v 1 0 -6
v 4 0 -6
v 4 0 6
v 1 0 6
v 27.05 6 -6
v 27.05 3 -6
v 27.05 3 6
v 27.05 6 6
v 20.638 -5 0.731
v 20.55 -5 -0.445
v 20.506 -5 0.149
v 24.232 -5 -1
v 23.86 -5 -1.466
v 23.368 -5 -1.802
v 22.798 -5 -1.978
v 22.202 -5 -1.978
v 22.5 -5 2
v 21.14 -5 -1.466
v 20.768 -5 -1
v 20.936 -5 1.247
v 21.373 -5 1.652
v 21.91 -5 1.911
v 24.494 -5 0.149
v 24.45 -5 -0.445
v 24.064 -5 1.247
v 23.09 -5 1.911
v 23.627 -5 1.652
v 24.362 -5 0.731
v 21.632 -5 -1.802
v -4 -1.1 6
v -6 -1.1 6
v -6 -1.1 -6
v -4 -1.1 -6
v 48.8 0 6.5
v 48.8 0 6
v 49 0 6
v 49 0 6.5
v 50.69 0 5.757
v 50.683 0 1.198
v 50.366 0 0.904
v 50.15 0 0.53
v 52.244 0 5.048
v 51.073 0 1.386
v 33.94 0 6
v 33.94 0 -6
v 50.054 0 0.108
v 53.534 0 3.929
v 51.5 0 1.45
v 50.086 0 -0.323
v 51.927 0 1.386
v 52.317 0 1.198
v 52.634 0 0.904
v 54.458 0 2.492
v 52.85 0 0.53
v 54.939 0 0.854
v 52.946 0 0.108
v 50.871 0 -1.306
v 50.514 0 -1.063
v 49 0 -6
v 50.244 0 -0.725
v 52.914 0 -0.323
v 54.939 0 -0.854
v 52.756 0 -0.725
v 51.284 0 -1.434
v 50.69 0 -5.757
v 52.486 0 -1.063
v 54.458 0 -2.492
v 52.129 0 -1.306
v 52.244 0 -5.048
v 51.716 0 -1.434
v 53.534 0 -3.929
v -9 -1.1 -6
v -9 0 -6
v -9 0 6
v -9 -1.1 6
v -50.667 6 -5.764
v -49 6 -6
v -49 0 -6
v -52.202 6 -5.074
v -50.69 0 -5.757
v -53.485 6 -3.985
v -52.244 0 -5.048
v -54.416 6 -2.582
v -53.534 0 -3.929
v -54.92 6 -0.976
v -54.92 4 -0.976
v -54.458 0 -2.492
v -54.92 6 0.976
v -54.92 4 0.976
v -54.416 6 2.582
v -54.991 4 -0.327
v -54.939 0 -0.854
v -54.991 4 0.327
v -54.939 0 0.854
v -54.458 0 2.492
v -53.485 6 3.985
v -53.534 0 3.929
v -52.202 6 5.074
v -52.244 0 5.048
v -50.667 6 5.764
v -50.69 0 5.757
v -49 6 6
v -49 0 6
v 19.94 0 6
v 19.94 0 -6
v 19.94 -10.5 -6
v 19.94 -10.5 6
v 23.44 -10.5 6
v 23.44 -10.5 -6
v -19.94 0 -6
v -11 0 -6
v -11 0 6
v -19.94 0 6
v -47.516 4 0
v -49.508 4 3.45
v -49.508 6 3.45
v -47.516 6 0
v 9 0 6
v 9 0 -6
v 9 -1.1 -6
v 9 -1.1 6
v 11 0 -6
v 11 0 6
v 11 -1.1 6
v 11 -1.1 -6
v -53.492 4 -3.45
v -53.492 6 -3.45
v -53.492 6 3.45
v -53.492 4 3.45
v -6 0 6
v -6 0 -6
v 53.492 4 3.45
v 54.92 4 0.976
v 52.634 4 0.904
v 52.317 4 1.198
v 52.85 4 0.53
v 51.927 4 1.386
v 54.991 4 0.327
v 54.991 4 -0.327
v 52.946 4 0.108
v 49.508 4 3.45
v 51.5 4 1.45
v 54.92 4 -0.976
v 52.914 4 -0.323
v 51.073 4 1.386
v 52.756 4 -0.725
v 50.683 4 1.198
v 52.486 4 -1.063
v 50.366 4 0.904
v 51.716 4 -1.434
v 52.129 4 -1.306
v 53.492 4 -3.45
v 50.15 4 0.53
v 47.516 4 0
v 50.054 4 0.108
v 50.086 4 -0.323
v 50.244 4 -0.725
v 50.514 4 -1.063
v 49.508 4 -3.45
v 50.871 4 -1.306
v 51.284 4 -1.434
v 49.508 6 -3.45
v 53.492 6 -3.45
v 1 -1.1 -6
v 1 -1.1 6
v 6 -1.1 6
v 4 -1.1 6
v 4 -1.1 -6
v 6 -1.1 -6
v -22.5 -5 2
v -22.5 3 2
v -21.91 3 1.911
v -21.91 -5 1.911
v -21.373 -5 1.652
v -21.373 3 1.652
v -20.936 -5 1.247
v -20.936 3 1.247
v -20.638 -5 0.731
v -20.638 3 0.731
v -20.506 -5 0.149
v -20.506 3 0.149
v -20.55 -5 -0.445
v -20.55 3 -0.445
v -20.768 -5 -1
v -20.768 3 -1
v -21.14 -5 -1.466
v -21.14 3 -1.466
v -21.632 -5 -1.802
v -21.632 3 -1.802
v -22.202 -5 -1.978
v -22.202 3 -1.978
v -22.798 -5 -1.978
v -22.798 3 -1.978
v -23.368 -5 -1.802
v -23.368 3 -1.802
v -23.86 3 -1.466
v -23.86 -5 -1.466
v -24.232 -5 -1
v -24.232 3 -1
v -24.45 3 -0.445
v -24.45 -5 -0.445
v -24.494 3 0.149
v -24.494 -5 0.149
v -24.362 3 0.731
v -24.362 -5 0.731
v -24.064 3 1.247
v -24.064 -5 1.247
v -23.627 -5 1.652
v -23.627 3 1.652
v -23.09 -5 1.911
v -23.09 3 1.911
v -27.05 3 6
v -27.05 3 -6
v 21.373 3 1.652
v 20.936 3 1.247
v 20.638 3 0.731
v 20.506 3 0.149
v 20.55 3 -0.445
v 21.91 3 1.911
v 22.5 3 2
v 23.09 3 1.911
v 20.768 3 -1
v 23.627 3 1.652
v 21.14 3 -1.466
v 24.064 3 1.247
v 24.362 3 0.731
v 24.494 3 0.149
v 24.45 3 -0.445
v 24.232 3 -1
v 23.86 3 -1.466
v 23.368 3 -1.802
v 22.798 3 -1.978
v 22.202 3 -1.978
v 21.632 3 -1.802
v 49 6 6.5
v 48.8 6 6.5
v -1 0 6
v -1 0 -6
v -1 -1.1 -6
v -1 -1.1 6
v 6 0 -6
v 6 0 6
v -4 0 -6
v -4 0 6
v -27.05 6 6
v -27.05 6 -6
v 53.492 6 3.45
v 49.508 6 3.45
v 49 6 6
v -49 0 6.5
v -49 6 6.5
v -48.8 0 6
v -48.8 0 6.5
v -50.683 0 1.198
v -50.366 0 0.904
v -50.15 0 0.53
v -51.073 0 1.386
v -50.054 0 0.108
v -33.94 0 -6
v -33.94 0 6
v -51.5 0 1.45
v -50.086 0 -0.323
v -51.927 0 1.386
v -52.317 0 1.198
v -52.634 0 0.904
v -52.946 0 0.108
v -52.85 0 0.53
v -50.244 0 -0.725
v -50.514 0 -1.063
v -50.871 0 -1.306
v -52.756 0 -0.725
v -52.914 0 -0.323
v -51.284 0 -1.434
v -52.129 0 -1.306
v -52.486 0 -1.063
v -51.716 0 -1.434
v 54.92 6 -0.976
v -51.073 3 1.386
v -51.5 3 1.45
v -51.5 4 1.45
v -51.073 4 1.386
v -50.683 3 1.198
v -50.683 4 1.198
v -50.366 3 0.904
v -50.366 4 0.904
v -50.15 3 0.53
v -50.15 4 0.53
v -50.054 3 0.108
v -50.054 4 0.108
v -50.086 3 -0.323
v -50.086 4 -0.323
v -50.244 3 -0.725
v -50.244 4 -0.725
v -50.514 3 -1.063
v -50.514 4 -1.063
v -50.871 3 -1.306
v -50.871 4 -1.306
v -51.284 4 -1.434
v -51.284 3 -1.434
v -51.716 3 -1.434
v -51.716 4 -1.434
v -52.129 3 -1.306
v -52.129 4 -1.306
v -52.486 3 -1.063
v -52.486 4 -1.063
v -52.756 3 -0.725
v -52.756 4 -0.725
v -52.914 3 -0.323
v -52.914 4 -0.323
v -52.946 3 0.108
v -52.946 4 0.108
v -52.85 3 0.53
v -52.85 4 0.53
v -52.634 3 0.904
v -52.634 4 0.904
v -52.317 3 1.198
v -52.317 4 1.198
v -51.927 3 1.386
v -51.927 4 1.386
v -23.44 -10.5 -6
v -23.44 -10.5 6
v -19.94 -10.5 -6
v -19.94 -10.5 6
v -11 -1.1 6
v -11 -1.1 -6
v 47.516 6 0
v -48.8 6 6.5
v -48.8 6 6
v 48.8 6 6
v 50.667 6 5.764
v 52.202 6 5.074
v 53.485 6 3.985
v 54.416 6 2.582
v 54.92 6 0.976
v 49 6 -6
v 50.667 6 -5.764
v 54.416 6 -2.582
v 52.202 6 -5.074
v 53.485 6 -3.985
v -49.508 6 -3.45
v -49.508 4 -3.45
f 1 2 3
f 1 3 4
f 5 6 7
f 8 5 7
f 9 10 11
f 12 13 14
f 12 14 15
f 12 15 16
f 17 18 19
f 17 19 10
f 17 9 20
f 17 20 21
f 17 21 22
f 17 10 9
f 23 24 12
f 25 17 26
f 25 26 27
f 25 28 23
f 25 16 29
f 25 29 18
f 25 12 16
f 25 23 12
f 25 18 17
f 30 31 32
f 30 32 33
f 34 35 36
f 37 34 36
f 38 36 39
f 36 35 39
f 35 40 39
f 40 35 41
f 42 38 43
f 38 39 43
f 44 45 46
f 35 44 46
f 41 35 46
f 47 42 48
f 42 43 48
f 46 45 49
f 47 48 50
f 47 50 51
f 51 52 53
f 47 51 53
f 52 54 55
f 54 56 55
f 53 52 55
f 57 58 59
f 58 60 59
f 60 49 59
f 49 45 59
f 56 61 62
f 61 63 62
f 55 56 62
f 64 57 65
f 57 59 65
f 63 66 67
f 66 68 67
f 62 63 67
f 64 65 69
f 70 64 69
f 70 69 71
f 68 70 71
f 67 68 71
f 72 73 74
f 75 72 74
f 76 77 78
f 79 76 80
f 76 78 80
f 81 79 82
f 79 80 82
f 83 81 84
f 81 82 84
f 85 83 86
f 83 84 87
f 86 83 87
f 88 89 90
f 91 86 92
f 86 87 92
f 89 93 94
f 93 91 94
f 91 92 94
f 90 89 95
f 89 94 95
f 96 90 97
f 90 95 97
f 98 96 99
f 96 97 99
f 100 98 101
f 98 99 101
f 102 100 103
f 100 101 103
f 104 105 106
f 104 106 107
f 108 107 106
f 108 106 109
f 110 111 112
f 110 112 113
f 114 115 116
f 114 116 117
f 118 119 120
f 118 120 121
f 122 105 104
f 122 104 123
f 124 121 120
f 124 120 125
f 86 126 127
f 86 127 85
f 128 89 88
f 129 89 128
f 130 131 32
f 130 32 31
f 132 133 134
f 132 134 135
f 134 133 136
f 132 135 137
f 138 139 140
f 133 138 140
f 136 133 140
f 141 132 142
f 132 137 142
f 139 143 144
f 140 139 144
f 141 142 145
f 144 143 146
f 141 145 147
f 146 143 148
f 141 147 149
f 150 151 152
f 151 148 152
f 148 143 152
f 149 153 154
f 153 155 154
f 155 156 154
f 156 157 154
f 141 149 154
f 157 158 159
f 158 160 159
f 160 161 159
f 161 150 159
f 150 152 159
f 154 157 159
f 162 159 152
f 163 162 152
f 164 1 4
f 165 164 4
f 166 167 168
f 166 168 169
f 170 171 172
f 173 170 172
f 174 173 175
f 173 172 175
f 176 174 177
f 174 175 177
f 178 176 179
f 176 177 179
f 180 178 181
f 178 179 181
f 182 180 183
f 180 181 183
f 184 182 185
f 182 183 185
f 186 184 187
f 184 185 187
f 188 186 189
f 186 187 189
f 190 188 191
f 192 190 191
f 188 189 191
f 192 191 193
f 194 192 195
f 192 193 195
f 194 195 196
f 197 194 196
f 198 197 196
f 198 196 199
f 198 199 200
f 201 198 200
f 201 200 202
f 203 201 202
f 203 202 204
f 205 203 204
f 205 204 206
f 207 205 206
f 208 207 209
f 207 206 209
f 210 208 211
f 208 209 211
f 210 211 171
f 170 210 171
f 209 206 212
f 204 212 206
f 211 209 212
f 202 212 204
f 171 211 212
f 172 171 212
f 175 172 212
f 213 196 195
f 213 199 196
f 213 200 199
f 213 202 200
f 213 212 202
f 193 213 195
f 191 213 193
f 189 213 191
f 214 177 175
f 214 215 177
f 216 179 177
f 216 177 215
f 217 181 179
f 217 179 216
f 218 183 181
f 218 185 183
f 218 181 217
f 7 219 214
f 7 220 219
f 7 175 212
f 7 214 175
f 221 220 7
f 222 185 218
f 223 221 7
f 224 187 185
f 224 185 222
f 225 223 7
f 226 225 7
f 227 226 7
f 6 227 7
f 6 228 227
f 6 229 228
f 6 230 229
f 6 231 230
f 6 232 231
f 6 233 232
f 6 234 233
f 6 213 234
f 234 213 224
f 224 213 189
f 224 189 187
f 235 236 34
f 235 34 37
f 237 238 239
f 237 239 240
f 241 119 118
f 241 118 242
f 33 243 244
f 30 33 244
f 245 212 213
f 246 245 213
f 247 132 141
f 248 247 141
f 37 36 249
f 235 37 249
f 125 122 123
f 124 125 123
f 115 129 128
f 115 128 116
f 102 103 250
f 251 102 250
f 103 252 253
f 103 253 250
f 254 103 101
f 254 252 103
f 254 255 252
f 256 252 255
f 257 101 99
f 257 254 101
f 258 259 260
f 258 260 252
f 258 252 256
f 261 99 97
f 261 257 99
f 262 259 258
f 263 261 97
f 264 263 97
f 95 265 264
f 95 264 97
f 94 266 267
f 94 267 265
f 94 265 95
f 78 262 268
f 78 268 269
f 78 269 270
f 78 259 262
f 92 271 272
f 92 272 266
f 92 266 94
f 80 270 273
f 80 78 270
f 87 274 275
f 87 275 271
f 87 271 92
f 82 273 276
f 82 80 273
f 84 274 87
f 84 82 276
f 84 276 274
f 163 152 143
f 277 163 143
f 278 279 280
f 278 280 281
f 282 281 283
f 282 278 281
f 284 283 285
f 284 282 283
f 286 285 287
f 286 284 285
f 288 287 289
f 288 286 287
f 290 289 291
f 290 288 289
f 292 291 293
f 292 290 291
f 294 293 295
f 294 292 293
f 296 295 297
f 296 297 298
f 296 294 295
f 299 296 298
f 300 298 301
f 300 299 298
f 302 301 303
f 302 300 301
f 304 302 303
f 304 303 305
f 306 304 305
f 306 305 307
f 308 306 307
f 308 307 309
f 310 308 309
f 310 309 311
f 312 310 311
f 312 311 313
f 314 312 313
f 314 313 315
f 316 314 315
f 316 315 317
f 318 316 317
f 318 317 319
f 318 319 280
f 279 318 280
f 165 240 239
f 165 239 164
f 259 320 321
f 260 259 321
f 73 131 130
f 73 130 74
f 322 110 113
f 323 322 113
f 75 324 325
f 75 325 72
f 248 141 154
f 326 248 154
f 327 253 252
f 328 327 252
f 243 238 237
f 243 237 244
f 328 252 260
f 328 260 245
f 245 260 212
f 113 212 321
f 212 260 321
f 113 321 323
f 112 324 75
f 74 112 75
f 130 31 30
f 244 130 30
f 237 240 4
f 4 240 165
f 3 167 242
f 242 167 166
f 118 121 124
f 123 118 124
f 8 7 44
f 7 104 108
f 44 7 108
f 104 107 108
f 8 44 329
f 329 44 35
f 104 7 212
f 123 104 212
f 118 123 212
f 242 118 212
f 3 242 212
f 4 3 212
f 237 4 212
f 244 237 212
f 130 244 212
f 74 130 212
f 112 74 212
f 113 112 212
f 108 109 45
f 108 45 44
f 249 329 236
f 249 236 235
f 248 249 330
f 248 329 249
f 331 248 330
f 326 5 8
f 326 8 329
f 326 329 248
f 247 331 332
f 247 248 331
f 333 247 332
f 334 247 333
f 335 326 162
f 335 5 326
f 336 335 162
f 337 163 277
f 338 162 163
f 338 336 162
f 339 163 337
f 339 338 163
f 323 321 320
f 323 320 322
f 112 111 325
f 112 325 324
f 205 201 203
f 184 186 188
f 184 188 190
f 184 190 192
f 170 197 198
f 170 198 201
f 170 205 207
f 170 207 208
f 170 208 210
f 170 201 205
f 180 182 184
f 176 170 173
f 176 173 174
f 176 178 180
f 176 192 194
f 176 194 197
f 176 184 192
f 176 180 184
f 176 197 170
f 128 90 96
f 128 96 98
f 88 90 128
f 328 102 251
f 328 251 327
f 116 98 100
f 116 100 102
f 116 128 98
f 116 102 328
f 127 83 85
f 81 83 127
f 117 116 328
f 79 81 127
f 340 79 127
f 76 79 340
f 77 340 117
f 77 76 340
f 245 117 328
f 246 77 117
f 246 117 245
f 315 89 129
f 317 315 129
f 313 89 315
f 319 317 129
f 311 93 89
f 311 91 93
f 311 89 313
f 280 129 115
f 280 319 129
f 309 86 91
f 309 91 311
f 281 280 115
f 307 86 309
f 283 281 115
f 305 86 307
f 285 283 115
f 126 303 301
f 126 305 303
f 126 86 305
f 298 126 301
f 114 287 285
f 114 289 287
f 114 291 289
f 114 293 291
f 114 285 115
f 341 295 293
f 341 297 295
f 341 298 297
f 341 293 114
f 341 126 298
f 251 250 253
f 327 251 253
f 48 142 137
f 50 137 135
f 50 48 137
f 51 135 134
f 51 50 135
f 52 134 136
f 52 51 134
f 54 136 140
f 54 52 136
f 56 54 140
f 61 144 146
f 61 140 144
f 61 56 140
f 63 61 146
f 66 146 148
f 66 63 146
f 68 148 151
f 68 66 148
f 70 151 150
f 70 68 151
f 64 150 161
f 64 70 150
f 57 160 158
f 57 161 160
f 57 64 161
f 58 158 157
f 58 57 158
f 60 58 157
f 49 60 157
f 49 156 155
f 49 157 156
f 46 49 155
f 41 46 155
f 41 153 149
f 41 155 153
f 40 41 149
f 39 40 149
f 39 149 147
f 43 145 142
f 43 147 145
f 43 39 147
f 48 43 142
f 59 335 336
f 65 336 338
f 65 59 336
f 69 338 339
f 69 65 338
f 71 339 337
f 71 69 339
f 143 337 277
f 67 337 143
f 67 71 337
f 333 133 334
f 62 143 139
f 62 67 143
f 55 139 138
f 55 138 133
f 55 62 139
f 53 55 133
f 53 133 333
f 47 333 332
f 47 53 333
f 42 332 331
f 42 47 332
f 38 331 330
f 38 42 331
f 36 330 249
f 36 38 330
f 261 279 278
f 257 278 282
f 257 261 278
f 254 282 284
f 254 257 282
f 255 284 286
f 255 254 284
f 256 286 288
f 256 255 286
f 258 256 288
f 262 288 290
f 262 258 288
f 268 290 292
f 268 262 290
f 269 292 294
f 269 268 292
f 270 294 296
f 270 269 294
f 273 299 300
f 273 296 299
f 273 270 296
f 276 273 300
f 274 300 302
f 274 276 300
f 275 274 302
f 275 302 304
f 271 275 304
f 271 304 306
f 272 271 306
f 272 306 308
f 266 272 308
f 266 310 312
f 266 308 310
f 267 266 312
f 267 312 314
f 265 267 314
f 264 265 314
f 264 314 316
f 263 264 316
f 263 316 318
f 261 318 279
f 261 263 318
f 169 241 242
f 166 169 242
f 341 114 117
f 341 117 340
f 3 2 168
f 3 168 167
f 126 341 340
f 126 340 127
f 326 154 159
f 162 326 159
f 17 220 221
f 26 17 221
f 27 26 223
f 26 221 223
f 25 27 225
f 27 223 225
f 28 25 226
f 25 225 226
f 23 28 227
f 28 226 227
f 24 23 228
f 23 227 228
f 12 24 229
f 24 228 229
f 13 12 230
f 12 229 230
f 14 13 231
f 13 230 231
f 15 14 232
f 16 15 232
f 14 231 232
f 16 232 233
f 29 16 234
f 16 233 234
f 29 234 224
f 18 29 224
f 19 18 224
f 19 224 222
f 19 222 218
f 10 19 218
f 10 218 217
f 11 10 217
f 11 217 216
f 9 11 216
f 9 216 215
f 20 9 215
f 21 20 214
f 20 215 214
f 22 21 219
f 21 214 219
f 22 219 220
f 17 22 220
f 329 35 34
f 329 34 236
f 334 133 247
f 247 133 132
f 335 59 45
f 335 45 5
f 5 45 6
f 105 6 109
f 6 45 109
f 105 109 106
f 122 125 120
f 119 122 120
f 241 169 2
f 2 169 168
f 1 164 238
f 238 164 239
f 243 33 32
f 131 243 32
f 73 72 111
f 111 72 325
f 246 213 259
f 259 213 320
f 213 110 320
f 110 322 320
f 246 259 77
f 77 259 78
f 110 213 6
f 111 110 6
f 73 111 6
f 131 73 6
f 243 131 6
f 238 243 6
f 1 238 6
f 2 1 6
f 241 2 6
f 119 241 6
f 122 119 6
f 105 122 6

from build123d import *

# Parameters (mm, degrees)
SKETCH1_R                 = 1.45
BOSS_EXTRUDE1_DEPTH       = 3
SKETCH4_W                 = 3.5
SKETCH4_H                 = 12
BOSS_EXTRUDE3_DEPTH       = 10.5
SKETCH5_W                 = 2
SKETCH5_H                 = 12
BOSS_EXTRUDE4_DEPTH       = 1.1
SKETCH6_W                 = 0.2
SKETCH6_H                 = 3
BOSS_EXTRUDE5_DEPTH       = 0.5
CHAMFER1_SIZE             = 10.5
F_3_0MM_DOWEL_HOLE1_D     = 2.9
F_3_0MM_DOWEL_HOLE1_DEPTH = 13.5
SKETCH10_R                = 1.45
BOSS_EXTRUDE6_DEPTH       = 3
CUT_EXTRUDE1_START        = -2
SKETCH11_R                = 1.45
CUT_EXTRUDE1_DEPTH        = 2
SKETCH12_R                = 2
CUT_EXTRUDE2_DEPTH        = 8


with BuildPart() as part:
    # Sketch1 → Boss-Extrude1 (new body)
    with BuildSketch(Plane(origin=(0, 0, 0), x_dir=(1, 0, 0), z_dir=(0, 1, 0))):
        with BuildLine():
            Line((-49, 6), (49, 6))
            ThreePointArc((49, 6), (55, 0), (49, -6))
            Line((49, -6), (-49, -6))
            ThreePointArc((-49, -6), (-55, 0), (-49, 6))
        make_face()
        with Locations(Location((-51.5, 0, 0), (0, 0, 270))):
            Circle(SKETCH1_R, mode=Mode.SUBTRACT)
        with Locations(Location((51.5, 0, 0), (0, 0, 270))):
            Circle(SKETCH1_R, mode=Mode.SUBTRACT)
    extrude(amount=BOSS_EXTRUDE1_DEPTH)

    # Sketch4 → Boss-Extrude3 (add)
    with BuildSketch(Plane.XZ):
        with Locations((-21.690023983, 0)):
            Rectangle(SKETCH4_W, SKETCH4_H)
        with Locations((21.690023983, 0)):
            Rectangle(SKETCH4_W, SKETCH4_H)
    extrude(amount=BOSS_EXTRUDE3_DEPTH)

    # Sketch5 → Boss-Extrude4 (add)
    with BuildSketch(Plane.XZ):
        with Locations((5, 0)):
            Rectangle(SKETCH5_W, SKETCH5_H)
        Rectangle(SKETCH5_W, SKETCH5_H)
        with Locations((10, 0)):
            Rectangle(SKETCH5_W, SKETCH5_H)
        with Locations((-5, 0)):
            Rectangle(SKETCH5_W, SKETCH5_H)
        with Locations((-10, 0)):
            Rectangle(SKETCH5_W, SKETCH5_H)
    extrude(amount=BOSS_EXTRUDE4_DEPTH)

    # Sketch6 → Boss-Extrude5 (add)
    with BuildSketch(Plane.XY.offset(6)):
        with Locations((48.9, 1.5)):
            Rectangle(SKETCH6_W, SKETCH6_H)
        with Locations((-48.9, 1.5)):
            Rectangle(SKETCH6_W, SKETCH6_H)
    extrude(amount=BOSS_EXTRUDE5_DEPTH)

    # Chamfer1
    chamfer1_edges = [part.edges().sort_by_distance(p)[0] for p in [
        (-23.440023983, 0, 0),
        (23.440023983, 0, 0),
    ]]
    chamfer(chamfer1_edges, length=CHAMFER1_SIZE - 0.0001)  # a hair under: the kernel refuses the full size

    # Ø3.0mm Dowel Hole1
    with Locations(Plane(origin=(0, 3, 0), x_dir=(1, 0, 0), z_dir=(0, 1, 0))):
        with Locations((-51.5, 0), (51.5, 0)):
            Hole(F_3_0MM_DOWEL_HOLE1_D / 2, depth=F_3_0MM_DOWEL_HOLE1_DEPTH)

    # Sketch10 → Boss-Extrude6 (add)
    # profile 1 of 2: a face of its own
    with BuildSketch(Plane(origin=(0, 3, 0), x_dir=(1, 0, 0), z_dir=(0, 1, 0))):
        with BuildLine():
            Line((-48.8, -6), (-27.05, -6))
            Line((-27.05, -6), (-27.05, 6))
            Line((-27.05, 6), (-49, 6))
            ThreePointArc((-49, 6), (-55, 0), (-49, -6))
            Line((-49, -6), (-49, -6.5))
            Line((-49, -6.5), (-48.8, -6.5))
            Line((-48.8, -6.5), (-48.8, -6))
        make_face()
        with Locations(Location((-51.5, 0, 0), (0, 0, 270.000000001))):
            Circle(SKETCH10_R, mode=Mode.SUBTRACT)
    # profile 2 of 2: a face of its own
    with BuildSketch(Plane(origin=(0, 3, 0), x_dir=(1, 0, 0), z_dir=(0, 1, 0))):
        with BuildLine():
            Line((27.05, 6), (27.05, -6))
            Line((27.05, -6), (48.8, -6))
            Line((48.8, -6), (48.8, -6.5))
            Line((48.8, -6.5), (49, -6.5))
            Line((49, -6.5), (49, -6))
            ThreePointArc((49, -6), (55, 0), (49, 6))
            Line((49, 6), (27.05, 6))
        make_face()
        with Locations(Location((51.5, 0, 0), (0, 0, 270))):
            Circle(SKETCH10_R, mode=Mode.SUBTRACT)
    extrude(amount=BOSS_EXTRUDE6_DEPTH)

    # Sketch11 → Cut-Extrude1 (cut)
    # profile 1 of 2: a face of its own
    with BuildSketch(Plane(origin=(0, 6, 0), x_dir=(1, 0, 0), z_dir=(0, 1, 0)).offset(CUT_EXTRUDE1_START)):
        Polygon((53.491858429, 3.45), (55.483716857, 0), (53.491858429, -3.45), (49.508141571, -3.45), (47.516283143, 0), (49.508141571, 3.45), align=None)
    # profile 2 of 2: a face of its own
    with BuildSketch(Plane(origin=(0, 6, 0), x_dir=(1, 0, 0), z_dir=(0, 1, 0)).offset(CUT_EXTRUDE1_START)):
        Polygon((-47.516283143, 0), (-49.508141571, 3.45), (-53.491858429, 3.45), (-55.483716857, 0), (-53.491858429, -3.45), (-49.508141571, -3.45), align=None)
        with Locations(Location((-51.5, 0, 0), (0, 0, 270.000000001))):
            Circle(SKETCH11_R, mode=Mode.SUBTRACT)
    extrude(amount=CUT_EXTRUDE1_DEPTH, mode=Mode.SUBTRACT)

    # Sketch12 → Cut-Extrude2 (cut)
    with BuildSketch(Plane(origin=(0, 3, 0), x_dir=(1, 0, 0), z_dir=(0, 1, 0))):
        with Locations(Location((-22.5, 0, 0), (0, 0, 270))):
            Circle(SKETCH12_R)
        with Locations(Location((22.5, 0, 0), (0, 0, 270))):
            Circle(SKETCH12_R)
    extrude(amount=-CUT_EXTRUDE2_DEPTH, mode=Mode.SUBTRACT)


solid = part.part
